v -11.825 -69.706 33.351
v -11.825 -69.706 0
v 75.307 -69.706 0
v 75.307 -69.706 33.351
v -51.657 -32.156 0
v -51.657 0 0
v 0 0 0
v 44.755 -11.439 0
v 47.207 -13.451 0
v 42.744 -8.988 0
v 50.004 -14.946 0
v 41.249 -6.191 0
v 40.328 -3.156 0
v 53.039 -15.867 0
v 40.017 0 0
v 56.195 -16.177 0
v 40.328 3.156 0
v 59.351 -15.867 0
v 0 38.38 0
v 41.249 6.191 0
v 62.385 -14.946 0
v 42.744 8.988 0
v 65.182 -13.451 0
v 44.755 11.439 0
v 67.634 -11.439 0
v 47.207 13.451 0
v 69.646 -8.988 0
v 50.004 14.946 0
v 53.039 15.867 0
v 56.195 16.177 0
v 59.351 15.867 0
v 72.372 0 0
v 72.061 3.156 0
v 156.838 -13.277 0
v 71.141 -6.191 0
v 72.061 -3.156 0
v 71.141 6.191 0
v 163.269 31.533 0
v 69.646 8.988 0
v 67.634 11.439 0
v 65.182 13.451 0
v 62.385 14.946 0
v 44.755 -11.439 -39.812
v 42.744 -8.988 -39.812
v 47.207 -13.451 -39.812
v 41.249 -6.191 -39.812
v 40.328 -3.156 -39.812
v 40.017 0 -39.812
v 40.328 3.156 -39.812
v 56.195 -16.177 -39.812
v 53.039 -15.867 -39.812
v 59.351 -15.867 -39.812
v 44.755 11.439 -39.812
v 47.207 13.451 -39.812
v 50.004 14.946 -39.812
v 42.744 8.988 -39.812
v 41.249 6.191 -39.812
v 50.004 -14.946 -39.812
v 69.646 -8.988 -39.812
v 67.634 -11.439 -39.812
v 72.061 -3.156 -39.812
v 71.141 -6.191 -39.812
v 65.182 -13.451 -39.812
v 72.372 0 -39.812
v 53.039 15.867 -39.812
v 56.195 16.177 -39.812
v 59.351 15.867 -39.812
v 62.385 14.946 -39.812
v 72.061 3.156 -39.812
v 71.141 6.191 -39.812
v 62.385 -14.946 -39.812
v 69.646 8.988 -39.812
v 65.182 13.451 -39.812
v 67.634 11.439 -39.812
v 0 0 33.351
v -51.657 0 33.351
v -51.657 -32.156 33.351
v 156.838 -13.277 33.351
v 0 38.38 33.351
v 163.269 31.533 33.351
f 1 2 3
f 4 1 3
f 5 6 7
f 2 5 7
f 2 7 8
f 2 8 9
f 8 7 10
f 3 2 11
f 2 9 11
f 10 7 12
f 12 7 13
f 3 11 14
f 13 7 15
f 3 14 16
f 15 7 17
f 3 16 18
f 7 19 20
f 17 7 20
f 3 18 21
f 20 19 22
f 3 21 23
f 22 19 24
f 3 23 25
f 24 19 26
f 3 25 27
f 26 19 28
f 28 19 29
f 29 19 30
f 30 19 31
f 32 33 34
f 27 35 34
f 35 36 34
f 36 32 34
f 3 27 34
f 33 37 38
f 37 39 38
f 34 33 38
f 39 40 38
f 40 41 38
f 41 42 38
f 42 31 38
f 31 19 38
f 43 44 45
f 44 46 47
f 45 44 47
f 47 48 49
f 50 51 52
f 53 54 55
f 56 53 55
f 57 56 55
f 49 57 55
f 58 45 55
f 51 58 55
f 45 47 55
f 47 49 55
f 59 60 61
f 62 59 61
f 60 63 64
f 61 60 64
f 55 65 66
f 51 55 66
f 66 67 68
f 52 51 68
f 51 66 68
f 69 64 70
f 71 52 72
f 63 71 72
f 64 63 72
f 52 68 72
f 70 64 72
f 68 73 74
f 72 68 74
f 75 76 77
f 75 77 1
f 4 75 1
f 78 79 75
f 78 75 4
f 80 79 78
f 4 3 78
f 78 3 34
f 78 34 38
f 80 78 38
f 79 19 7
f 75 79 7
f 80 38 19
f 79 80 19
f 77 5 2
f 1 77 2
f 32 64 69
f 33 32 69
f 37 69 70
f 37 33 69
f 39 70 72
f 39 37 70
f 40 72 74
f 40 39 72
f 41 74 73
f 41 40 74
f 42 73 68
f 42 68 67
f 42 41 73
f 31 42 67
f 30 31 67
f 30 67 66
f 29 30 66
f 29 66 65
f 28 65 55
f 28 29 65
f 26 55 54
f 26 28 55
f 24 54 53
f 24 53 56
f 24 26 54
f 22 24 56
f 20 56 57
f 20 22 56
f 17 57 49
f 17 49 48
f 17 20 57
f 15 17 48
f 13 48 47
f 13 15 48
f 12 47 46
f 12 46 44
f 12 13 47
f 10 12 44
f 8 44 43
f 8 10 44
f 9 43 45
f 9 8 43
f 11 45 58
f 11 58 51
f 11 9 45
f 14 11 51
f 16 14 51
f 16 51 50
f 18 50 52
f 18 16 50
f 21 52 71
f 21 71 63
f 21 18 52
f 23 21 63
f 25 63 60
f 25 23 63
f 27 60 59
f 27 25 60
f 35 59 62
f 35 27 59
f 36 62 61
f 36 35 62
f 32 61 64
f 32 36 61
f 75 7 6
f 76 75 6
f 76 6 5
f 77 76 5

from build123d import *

# Parameters (mm, degrees)
F1_DEPTH = 33.3509109914
F2_R     = 16.1774889393
F3_DEPTH = 39.8117862642


# Not quite as in the source:
# - a feature names something its author has since deleted; it is built from what else it names


with BuildPart() as f1:
    # F0 (on Top) → F1 (new body)
    with BuildSketch(Plane.XY):
        Polygon((75.3069221973, -69.7055906057), (156.8375527859, -13.2772475481), (160.0531488657, 9.1281235218), (163.2687449455, 31.5334945917), (0, 38.3795797825), (0, 0), (-51.6568571329, 0), (-51.6568571329, -32.155841589), (-11.8250846863, -69.7055906057), align=None)
    extrude(amount=F1_DEPTH)

    # F2 (on Top) → F3 (join)
    with BuildSketch(Plane.XY):
        with Locations((56.1946332455, 0)):
            Circle(F2_R)
    extrude(amount=-F3_DEPTH)


solid = f1.part
